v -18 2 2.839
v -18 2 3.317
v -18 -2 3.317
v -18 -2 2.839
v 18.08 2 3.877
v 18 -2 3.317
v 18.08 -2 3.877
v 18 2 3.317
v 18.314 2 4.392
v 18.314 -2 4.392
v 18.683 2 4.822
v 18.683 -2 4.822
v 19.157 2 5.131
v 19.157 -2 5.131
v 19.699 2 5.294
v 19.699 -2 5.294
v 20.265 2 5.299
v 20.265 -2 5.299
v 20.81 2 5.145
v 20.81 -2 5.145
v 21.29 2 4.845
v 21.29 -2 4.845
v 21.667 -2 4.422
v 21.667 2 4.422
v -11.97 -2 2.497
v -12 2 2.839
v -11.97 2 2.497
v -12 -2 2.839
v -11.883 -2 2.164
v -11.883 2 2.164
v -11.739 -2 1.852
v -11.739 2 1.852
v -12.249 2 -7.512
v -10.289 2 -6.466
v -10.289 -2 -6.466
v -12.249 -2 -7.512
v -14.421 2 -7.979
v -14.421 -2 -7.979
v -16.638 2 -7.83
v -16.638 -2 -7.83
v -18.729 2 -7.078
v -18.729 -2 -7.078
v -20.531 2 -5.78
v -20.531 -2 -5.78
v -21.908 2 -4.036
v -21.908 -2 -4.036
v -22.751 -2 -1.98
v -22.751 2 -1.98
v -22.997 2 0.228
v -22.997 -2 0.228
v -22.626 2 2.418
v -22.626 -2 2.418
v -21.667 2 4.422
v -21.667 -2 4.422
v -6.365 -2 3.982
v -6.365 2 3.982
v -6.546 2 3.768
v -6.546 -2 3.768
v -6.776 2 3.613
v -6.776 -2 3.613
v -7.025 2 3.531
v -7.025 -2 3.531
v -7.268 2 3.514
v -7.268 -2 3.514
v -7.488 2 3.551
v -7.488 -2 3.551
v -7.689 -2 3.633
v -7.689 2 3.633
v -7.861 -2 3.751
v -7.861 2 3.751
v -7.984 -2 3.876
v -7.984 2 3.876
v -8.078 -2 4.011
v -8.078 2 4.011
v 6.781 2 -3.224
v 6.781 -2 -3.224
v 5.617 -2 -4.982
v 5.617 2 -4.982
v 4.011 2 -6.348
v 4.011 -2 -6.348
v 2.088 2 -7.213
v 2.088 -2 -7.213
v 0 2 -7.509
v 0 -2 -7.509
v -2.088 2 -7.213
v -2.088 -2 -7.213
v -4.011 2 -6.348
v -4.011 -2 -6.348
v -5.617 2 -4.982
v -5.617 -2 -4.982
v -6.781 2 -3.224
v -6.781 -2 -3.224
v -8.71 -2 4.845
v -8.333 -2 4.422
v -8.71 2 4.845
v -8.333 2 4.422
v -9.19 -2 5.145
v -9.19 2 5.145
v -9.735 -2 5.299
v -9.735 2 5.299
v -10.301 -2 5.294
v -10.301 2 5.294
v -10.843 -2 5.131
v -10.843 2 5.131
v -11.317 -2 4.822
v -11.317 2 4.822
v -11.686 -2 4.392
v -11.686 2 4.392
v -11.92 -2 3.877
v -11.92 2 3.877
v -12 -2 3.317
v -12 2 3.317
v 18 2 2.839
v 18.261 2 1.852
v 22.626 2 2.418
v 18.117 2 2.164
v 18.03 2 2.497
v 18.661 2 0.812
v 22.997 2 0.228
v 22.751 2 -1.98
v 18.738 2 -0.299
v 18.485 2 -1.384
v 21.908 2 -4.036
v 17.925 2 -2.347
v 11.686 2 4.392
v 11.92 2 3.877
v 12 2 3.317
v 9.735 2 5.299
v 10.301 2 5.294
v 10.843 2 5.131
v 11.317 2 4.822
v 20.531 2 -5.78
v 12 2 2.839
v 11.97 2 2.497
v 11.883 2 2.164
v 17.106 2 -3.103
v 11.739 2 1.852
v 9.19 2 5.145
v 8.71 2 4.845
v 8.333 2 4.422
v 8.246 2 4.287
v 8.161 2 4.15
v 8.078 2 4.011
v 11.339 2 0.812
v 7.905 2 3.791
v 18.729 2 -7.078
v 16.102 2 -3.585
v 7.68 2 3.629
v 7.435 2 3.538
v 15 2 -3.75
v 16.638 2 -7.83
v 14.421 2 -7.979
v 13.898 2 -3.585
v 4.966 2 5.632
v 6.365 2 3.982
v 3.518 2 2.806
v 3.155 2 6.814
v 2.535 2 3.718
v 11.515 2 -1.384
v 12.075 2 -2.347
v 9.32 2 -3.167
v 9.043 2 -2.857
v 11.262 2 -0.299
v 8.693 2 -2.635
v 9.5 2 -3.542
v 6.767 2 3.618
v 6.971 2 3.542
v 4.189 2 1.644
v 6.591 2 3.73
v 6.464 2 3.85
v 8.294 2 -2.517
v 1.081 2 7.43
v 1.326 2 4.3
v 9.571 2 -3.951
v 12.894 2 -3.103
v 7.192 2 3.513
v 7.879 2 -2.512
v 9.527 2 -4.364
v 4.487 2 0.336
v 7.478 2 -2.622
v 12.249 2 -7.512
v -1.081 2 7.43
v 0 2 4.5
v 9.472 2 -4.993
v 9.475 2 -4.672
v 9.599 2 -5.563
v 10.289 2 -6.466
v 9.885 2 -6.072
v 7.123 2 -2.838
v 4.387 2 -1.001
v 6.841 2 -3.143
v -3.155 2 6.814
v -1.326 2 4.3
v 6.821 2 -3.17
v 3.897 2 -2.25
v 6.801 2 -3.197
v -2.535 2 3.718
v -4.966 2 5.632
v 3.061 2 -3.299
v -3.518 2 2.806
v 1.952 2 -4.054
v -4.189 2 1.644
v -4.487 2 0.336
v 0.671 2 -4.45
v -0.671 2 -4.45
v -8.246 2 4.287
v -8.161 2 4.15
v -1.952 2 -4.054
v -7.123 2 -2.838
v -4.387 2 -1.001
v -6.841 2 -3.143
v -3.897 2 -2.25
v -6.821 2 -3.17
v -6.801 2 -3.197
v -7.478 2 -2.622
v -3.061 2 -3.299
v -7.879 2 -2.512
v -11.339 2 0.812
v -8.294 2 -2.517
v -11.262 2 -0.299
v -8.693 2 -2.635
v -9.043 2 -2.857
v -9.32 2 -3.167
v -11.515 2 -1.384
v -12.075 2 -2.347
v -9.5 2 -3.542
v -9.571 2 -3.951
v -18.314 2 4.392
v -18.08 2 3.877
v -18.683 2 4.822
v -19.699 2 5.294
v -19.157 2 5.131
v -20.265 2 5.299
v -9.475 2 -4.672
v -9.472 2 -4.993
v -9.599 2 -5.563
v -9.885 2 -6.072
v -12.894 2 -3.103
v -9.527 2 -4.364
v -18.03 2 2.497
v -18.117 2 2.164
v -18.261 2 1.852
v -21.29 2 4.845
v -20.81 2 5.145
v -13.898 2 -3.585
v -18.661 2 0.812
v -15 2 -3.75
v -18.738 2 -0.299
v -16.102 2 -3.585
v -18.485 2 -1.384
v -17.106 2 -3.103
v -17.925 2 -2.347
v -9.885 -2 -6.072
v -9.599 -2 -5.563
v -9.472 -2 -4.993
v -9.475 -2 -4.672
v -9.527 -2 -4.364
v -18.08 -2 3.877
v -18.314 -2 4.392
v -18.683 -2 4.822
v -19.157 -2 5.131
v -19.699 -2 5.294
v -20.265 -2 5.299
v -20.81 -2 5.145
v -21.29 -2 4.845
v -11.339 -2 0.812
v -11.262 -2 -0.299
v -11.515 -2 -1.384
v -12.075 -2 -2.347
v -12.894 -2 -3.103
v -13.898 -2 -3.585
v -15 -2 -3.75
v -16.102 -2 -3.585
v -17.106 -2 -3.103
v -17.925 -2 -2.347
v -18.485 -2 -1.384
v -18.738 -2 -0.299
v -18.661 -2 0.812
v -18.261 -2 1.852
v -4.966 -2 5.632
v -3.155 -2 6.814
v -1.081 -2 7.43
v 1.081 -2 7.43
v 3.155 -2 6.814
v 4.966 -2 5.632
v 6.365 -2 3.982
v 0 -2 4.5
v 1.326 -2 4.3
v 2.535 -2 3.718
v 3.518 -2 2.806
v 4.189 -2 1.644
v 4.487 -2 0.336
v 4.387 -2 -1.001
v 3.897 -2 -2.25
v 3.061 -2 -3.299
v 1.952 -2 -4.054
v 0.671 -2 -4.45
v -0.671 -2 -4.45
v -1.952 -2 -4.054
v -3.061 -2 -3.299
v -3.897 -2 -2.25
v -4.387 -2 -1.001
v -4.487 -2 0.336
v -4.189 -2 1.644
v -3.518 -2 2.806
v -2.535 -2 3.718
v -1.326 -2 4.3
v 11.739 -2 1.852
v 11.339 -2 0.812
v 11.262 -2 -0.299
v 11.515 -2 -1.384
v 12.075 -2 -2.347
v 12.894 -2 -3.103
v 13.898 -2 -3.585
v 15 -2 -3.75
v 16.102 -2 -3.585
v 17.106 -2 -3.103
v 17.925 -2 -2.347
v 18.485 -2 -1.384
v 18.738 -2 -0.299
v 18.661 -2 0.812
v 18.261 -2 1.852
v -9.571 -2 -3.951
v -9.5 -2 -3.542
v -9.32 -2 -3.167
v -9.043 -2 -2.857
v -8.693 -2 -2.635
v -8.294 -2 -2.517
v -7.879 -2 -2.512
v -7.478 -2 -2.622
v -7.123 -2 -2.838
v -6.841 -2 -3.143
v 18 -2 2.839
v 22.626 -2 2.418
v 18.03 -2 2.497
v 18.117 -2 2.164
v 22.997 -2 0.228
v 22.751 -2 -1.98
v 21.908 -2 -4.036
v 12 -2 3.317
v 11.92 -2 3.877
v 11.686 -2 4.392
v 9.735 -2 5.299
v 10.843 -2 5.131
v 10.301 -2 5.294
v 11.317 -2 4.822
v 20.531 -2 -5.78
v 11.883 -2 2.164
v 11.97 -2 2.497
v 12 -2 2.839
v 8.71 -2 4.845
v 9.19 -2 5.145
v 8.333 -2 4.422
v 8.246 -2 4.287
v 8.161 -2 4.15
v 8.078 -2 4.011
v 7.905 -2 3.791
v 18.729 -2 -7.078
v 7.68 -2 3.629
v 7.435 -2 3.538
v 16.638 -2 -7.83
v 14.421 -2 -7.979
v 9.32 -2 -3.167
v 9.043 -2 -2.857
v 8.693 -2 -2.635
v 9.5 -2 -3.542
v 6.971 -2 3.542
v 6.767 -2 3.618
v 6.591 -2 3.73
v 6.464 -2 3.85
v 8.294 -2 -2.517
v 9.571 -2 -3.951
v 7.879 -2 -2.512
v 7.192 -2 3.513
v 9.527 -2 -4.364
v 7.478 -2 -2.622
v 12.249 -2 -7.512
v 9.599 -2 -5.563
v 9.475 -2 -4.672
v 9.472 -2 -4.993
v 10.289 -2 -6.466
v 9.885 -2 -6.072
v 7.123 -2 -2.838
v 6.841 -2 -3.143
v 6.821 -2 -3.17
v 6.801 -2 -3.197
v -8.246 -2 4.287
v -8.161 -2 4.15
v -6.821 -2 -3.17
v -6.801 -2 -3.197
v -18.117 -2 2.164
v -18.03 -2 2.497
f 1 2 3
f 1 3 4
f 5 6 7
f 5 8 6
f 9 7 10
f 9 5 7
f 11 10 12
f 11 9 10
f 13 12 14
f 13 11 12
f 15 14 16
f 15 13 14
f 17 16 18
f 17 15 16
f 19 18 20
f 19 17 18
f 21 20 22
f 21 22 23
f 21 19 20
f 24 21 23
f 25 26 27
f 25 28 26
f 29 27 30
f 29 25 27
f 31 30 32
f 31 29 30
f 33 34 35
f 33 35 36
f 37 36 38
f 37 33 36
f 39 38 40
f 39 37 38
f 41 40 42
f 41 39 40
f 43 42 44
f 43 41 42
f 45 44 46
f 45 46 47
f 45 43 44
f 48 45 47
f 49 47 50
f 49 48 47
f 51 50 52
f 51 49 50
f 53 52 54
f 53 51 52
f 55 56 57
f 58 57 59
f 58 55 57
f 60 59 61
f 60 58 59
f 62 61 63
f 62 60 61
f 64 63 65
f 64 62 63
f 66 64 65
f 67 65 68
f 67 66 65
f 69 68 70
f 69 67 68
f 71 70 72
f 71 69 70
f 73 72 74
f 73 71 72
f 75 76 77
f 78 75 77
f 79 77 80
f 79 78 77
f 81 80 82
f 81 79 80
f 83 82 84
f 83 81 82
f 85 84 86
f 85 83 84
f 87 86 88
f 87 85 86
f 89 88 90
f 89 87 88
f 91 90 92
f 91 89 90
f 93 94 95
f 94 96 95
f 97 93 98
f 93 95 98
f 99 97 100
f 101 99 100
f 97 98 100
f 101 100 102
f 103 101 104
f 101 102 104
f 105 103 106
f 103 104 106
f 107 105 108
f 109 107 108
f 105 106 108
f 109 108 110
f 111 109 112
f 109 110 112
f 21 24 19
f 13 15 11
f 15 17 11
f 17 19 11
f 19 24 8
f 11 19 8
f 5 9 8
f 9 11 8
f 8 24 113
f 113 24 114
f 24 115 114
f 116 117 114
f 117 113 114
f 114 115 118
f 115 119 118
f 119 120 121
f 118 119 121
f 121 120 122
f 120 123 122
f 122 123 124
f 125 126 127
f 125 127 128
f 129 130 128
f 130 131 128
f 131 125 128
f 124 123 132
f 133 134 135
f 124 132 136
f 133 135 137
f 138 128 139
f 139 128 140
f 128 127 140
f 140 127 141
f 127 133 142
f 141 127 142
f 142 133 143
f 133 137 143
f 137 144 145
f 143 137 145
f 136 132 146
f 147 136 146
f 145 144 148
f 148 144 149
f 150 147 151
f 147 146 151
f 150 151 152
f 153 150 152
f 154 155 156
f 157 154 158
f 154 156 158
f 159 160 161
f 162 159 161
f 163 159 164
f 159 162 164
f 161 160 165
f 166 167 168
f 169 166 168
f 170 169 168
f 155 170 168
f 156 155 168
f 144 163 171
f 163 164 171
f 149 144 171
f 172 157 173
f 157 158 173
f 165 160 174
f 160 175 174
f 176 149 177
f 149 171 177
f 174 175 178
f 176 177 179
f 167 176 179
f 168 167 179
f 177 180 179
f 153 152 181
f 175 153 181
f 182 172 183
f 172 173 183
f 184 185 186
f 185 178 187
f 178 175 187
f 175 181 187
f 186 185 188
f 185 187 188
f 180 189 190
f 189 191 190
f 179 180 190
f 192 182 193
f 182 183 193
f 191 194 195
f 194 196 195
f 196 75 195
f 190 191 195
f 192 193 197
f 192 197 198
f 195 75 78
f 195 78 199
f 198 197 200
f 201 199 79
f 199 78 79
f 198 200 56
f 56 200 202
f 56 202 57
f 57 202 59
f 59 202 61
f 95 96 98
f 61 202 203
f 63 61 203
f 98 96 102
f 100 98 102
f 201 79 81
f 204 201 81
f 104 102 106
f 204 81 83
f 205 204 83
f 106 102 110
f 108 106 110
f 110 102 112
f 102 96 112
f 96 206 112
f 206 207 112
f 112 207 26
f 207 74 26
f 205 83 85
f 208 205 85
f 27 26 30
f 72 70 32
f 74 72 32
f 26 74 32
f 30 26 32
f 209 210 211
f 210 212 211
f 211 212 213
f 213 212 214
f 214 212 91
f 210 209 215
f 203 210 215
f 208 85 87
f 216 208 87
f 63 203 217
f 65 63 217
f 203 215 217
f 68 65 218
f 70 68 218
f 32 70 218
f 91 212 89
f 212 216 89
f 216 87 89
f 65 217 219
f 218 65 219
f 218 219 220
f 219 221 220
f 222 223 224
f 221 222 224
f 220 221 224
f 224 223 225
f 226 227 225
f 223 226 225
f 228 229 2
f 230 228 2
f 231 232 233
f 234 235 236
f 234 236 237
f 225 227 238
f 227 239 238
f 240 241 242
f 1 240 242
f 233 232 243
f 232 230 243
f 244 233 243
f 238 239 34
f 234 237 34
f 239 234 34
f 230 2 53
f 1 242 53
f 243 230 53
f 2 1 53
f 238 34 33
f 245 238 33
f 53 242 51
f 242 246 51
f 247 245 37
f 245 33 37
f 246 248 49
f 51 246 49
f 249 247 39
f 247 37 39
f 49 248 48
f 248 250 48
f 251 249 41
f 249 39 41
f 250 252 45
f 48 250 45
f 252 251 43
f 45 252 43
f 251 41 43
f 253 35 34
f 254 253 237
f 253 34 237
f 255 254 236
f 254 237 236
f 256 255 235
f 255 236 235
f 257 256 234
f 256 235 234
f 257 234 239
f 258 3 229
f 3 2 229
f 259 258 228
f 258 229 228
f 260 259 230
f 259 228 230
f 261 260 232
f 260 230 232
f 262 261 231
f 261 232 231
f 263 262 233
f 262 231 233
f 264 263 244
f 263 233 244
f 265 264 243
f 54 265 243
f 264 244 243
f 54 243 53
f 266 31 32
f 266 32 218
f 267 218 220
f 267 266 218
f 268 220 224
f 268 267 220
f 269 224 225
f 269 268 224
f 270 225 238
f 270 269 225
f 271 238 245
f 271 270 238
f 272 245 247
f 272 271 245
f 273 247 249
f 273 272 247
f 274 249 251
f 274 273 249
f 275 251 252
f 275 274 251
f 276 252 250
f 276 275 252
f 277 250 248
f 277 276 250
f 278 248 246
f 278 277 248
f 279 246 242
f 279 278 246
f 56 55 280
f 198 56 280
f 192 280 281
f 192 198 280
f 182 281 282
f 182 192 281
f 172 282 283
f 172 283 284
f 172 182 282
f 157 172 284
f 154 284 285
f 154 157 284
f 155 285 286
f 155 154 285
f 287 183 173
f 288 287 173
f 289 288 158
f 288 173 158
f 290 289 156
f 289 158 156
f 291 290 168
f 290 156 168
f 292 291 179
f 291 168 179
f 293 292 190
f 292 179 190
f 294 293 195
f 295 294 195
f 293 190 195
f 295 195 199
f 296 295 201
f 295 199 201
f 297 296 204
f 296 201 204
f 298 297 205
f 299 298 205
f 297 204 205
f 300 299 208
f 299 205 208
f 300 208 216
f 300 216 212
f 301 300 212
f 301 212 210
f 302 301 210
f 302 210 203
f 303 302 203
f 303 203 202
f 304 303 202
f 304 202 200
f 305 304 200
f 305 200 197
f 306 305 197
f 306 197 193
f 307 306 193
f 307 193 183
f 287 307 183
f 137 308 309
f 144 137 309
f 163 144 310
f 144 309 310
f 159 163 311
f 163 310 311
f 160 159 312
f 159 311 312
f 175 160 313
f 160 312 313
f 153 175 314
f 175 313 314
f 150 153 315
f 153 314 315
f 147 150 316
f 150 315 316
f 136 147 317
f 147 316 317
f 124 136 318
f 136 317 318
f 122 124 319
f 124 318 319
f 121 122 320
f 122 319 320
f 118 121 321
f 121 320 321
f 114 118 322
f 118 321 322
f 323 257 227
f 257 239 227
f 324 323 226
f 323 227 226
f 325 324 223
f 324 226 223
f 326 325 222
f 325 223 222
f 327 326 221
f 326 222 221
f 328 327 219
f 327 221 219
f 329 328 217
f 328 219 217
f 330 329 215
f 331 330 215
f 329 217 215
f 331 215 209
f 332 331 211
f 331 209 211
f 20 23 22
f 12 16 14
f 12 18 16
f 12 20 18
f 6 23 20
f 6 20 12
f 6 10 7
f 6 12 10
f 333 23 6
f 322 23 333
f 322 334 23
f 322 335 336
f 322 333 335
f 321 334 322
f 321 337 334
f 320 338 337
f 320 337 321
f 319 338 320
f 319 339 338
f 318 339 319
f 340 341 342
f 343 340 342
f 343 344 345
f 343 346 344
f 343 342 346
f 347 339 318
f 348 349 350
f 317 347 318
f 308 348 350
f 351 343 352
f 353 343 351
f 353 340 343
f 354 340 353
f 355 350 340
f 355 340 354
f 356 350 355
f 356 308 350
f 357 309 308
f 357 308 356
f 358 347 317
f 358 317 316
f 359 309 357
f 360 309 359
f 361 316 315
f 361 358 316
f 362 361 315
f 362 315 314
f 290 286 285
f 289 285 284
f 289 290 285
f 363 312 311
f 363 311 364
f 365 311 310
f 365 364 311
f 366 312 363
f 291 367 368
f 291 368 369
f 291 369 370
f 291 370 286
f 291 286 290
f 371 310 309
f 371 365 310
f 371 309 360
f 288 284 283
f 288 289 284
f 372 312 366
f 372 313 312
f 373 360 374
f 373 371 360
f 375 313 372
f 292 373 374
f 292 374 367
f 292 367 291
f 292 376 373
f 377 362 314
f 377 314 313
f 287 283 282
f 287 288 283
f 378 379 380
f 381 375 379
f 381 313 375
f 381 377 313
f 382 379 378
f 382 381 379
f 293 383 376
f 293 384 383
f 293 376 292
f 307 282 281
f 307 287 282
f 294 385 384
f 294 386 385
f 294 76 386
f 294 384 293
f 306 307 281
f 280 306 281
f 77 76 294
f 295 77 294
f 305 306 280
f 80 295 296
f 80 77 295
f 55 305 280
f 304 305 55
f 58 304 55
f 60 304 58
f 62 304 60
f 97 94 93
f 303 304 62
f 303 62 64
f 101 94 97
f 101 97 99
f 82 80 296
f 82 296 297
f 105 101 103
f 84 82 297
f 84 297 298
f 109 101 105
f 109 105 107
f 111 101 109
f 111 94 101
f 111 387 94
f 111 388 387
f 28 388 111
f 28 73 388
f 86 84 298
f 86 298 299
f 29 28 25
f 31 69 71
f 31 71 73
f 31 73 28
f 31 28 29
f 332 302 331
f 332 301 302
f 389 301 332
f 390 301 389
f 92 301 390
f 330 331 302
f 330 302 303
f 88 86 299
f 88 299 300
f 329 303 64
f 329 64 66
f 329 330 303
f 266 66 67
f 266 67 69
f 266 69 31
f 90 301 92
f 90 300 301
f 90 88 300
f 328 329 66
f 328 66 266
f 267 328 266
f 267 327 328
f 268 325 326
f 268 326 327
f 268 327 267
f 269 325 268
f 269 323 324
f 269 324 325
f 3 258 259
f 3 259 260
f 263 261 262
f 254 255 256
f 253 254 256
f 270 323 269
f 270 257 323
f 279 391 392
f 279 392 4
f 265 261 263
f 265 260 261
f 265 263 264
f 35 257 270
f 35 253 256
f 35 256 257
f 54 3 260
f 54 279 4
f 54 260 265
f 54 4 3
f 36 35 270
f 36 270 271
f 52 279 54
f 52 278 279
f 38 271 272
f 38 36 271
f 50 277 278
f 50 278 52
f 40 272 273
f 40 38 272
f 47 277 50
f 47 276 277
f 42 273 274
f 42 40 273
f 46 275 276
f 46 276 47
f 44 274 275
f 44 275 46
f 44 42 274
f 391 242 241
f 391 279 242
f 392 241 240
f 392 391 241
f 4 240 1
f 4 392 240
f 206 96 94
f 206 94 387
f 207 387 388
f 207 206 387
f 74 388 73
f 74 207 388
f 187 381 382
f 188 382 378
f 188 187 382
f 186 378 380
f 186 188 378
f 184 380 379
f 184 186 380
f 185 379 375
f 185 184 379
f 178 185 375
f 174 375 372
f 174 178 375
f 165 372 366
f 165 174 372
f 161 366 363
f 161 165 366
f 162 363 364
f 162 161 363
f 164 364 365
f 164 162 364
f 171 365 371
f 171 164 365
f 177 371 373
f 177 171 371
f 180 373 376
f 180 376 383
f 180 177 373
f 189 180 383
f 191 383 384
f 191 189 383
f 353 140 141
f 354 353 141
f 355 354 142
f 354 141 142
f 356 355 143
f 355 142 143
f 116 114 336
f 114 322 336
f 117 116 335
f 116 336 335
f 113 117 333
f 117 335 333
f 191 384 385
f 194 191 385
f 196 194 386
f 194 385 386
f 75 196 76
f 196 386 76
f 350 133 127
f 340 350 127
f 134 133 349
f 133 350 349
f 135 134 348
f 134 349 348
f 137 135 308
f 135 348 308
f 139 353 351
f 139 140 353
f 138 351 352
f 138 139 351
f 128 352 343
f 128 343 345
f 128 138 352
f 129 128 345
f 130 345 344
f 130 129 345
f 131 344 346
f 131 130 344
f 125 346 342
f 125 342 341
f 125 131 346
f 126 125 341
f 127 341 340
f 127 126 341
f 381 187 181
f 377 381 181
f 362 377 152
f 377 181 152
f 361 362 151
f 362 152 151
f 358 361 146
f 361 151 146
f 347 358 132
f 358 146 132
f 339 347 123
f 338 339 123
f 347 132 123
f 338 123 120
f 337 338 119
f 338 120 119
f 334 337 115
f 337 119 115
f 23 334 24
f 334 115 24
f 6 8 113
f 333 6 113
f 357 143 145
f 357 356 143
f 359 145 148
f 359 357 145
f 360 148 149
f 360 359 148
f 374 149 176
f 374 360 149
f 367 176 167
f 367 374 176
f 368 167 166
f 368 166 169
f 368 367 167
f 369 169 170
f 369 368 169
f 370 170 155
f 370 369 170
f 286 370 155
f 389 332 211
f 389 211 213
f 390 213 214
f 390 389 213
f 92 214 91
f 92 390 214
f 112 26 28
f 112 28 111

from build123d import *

# Parameters (mm, degrees)
SKIZZE1_R                       = 3.75
AUFSATZ_LINEAR_AUSTRAGEN1_DEPTH = 2
SKIZZE2_R                       = 1.5
SCHNITT_LINEAR_AUSTRAGEN1_DEPTH = 25.677925359
VERRUNDUNG1_R                   = 2
VERRUNDUNG2_R                   = 2
SKIZZE4_R                       = 7.508546114
AUFSATZ_LINEAR_AUSTRAGEN2_DEPTH = 4
SKIZZE5_R                       = 4.5
SCHNITT_LINEAR_AUSTRAGEN3_DEPTH = 25.6779255
VERRUNDUNG4_R                   = 1


with BuildPart() as part:
    # Skizze1 → Aufsatz-Linear austragen1 (new, symmetric)
    with BuildSketch(Plane(origin=(0, 0, 0), x_dir=(1, 0, 0), z_dir=(0, 1, 0))):
        with BuildLine():
            Line((-7.583801513, -3), (0, -3))
            Line((0, -3), (0, 4))
            Line((0, 4), (-8.07179677, 4))
            ThreePointArc((-8.07179677, 4), (-22.980630624, -0.556358556), (-7.583801513, -3))
        make_face()
        with Locations(Location((-15, 0, 0), (0, 0, 270))):
            Circle(SKIZZE1_R, mode=Mode.SUBTRACT)
    extrude(amount=AUFSATZ_LINEAR_AUSTRAGEN1_DEPTH, both=True)

    # Skizze2 → Schnitt-Linear austragen1 (cut, through all)
    with BuildSketch(Plane(origin=(0, 2, 0), x_dir=(1, 0, 0), z_dir=(0, 1, 0))):
        with Locations((-8.07179677, 4)):
            Circle(SKIZZE2_R)
        with BuildLine():
            Line((-12, 0), (-12, -8))
            ThreePointArc((-12, -8), (-15, -11), (-18, -8))
            Line((-18, -8), (-18, 0))
            ThreePointArc((-18, 0), (-15, 3), (-12, 0))
        make_face()
    extrude(amount=-SCHNITT_LINEAR_AUSTRAGEN1_DEPTH, mode=Mode.SUBTRACT)

    # Verrundung1
    verrundung1_edges = [part.edges().sort_by_distance(p)[0] for p in [
        (-8.94027842, 0, -5.223004343),
        (-6.57179677, 0, -4),
        (-18, 0, 2.25),
        (-12, 0, 2.25),
        (-7.583801513, 0, 3),
    ]]
    fillet(verrundung1_edges, radius=VERRUNDUNG1_R)

    # Verrundung2
    verrundung2_edges = [part.edges().sort_by_distance(p)[0] for p in [
        (-12, 0, 7.416198487),
        (-18, 0, 7.416198487),
    ]]
    fillet(verrundung2_edges, radius=VERRUNDUNG2_R)

    # Spiegeln1: part across plane


with BuildPart() as part_1:
    add(part.part)
    add(part.part.mirror(Plane(origin=(0, 2, -4), x_dir=(0, 0, 1), z_dir=(-1, 0, 0))))

    # Skizze4 → Aufsatz-Linear austragen2 (add)
    with BuildSketch(Plane(origin=(0, 2, 0), x_dir=(1, 0, 0), z_dir=(0, 1, 0))):
        Circle(SKIZZE4_R)
    extrude(amount=-AUFSATZ_LINEAR_AUSTRAGEN2_DEPTH)

    # Skizze5 → Schnitt-Linear austragen3 (cut, through all)
    with BuildSketch(Plane(origin=(0, 2, 0), x_dir=(1, 0, 0), z_dir=(0, 1, 0))):
        with Locations(Location((0, 0, 0), (0, 0, 270))):
            Circle(SKIZZE5_R)
    extrude(amount=-SCHNITT_LINEAR_AUSTRAGEN3_DEPTH, mode=Mode.SUBTRACT)

    # Verrundung4
    verrundung4_edges = [part_1.edges().sort_by_distance(p)[0] for p in [
        (6.853540925, 0, 3.06712268),
        (-6.853540925, 0, 3.06712268),
    ]]
    fillet(verrundung4_edges, radius=VERRUNDUNG4_R)


solid = part_1.part
